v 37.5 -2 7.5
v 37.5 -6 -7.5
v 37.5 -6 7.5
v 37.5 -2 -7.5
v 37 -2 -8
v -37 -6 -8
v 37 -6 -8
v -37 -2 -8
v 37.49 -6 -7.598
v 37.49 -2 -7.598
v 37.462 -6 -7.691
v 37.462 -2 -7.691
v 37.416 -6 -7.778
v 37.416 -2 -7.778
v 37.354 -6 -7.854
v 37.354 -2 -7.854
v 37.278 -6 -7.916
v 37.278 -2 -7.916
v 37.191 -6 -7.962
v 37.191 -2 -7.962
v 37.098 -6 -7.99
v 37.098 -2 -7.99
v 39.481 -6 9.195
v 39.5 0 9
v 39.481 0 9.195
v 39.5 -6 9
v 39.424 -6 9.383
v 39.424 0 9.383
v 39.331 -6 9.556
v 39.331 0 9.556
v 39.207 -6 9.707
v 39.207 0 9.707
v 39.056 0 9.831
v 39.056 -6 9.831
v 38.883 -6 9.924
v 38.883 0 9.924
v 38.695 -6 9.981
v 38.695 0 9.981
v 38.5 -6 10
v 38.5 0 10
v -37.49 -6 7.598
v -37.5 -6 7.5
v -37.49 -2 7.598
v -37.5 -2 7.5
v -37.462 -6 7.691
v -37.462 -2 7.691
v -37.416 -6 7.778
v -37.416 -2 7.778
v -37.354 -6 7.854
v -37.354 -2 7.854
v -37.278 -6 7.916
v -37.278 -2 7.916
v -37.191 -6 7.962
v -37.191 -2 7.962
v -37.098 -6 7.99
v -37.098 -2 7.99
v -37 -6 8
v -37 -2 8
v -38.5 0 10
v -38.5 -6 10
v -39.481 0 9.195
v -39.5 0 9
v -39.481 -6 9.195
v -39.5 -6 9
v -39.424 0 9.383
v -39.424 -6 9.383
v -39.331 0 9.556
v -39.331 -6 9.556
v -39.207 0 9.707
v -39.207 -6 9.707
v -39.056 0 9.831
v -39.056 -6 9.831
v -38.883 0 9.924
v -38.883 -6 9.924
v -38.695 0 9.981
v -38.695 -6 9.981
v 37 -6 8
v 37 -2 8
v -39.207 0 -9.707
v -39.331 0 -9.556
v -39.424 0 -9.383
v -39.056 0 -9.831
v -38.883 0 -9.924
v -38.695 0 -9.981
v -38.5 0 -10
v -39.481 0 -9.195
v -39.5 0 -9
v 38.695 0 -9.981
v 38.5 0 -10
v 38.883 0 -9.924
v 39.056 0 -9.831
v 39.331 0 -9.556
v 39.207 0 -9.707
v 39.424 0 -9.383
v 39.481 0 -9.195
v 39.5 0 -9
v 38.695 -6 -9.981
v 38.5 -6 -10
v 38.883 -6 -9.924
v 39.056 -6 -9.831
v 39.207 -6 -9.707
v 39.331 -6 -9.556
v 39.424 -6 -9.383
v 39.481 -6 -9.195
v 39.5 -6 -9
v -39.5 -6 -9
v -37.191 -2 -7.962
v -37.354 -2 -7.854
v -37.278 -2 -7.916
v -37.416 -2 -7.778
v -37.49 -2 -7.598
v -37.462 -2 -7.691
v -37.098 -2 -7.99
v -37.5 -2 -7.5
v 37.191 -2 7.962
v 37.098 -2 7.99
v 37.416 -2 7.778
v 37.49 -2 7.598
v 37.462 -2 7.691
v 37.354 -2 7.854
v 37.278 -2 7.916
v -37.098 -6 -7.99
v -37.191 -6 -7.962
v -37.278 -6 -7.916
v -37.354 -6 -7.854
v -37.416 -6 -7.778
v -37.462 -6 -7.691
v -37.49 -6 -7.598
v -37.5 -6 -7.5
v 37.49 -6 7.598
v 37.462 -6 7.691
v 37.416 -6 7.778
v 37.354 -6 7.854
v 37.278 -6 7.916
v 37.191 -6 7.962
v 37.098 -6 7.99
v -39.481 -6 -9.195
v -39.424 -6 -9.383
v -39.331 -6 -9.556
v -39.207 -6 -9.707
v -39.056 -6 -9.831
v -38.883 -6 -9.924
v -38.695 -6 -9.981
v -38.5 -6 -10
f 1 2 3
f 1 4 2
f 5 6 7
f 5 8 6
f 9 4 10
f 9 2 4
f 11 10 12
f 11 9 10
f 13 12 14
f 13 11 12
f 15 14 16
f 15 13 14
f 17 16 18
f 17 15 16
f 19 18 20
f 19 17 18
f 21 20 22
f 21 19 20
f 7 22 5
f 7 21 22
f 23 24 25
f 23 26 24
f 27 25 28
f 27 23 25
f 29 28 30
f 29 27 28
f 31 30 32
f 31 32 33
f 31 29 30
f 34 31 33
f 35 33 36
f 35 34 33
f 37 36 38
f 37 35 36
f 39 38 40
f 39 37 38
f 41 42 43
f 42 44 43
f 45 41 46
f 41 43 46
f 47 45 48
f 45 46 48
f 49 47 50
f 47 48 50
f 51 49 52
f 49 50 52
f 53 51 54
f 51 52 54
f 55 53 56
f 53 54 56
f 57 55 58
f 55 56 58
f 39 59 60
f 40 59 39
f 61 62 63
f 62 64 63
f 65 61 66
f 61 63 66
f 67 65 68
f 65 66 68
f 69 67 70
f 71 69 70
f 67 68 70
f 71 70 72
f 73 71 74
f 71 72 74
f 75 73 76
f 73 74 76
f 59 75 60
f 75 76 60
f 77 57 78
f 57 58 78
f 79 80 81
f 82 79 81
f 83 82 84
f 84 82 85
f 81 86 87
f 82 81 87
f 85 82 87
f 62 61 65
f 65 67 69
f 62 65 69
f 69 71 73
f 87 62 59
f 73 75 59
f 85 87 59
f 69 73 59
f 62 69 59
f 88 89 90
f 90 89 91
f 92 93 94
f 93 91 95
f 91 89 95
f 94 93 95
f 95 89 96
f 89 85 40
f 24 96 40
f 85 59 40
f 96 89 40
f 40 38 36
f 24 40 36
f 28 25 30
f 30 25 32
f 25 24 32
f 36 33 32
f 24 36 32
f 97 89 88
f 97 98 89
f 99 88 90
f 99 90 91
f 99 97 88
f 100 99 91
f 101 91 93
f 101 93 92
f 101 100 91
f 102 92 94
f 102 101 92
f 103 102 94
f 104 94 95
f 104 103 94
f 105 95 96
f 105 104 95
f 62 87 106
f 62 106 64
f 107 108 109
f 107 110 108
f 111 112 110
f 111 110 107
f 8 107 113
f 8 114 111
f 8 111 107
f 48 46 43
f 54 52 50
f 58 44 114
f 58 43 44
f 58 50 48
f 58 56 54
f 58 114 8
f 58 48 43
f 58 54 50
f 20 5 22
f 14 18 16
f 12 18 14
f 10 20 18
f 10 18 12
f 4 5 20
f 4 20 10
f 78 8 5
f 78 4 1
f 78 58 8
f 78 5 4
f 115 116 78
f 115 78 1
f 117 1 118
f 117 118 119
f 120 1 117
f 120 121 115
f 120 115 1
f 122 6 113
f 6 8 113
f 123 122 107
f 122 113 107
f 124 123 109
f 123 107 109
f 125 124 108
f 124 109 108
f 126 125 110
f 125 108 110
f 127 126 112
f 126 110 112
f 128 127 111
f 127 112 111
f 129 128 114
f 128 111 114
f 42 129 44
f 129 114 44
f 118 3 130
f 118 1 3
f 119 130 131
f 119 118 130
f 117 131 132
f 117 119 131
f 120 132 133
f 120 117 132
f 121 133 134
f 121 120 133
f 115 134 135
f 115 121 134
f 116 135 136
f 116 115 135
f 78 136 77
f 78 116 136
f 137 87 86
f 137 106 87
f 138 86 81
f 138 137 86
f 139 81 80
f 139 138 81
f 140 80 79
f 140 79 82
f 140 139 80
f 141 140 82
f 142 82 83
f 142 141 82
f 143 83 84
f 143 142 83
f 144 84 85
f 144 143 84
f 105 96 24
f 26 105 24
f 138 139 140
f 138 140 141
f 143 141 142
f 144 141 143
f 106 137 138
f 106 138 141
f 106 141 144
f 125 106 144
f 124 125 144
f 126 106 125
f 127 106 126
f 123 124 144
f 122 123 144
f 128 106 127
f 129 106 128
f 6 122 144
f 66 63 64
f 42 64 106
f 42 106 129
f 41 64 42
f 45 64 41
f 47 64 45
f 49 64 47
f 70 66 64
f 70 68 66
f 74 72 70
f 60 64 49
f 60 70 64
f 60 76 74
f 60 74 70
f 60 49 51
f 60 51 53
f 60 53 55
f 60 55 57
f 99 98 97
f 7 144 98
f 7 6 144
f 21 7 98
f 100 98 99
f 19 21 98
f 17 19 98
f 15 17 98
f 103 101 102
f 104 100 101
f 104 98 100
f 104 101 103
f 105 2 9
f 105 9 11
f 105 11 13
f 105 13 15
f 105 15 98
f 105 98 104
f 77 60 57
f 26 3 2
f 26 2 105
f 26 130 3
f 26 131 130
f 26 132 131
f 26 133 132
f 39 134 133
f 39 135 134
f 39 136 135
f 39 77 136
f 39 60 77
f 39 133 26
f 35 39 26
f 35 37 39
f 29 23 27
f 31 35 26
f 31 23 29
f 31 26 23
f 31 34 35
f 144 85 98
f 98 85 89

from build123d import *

# Parameters (mm, degrees)
F0_W     = 79
F0_H     = 20
F1_DEPTH = 6
F2_T     = -2
F3_R     = 1
F4_R     = 0.5


with BuildPart() as f1:
    # F0 (on Front) → F1 (new body)
    with BuildSketch(Plane.XZ):
        Rectangle(F0_W, F0_H)
    extrude(amount=F1_DEPTH)

    # F2
    f2_openings = [f1.faces().sort_by_distance(p)[0] for p in [
        (0, -6, 0),
    ]]
    offset(amount=F2_T, openings=f2_openings)

    # F3
    f3_edges = [f1.edges().sort_by_distance(p)[0] for p in [
        (39.5, -3, -10),
        (-39.5, -3, -10),
        (-39.5, -3, 10),
        (39.5, -3, 10),
    ]]
    fillet(f3_edges, radius=F3_R)

    # F4
    f4_edges = [f1.edges().sort_by_distance(p)[0] for p in [
        (-37.5, -4, -8),
        (37.5, -4, -8),
        (37.5, -4, 8),
        (-37.5, -4, 8),
    ]]
    fillet(f4_edges, radius=F4_R)


solid = f1.part
